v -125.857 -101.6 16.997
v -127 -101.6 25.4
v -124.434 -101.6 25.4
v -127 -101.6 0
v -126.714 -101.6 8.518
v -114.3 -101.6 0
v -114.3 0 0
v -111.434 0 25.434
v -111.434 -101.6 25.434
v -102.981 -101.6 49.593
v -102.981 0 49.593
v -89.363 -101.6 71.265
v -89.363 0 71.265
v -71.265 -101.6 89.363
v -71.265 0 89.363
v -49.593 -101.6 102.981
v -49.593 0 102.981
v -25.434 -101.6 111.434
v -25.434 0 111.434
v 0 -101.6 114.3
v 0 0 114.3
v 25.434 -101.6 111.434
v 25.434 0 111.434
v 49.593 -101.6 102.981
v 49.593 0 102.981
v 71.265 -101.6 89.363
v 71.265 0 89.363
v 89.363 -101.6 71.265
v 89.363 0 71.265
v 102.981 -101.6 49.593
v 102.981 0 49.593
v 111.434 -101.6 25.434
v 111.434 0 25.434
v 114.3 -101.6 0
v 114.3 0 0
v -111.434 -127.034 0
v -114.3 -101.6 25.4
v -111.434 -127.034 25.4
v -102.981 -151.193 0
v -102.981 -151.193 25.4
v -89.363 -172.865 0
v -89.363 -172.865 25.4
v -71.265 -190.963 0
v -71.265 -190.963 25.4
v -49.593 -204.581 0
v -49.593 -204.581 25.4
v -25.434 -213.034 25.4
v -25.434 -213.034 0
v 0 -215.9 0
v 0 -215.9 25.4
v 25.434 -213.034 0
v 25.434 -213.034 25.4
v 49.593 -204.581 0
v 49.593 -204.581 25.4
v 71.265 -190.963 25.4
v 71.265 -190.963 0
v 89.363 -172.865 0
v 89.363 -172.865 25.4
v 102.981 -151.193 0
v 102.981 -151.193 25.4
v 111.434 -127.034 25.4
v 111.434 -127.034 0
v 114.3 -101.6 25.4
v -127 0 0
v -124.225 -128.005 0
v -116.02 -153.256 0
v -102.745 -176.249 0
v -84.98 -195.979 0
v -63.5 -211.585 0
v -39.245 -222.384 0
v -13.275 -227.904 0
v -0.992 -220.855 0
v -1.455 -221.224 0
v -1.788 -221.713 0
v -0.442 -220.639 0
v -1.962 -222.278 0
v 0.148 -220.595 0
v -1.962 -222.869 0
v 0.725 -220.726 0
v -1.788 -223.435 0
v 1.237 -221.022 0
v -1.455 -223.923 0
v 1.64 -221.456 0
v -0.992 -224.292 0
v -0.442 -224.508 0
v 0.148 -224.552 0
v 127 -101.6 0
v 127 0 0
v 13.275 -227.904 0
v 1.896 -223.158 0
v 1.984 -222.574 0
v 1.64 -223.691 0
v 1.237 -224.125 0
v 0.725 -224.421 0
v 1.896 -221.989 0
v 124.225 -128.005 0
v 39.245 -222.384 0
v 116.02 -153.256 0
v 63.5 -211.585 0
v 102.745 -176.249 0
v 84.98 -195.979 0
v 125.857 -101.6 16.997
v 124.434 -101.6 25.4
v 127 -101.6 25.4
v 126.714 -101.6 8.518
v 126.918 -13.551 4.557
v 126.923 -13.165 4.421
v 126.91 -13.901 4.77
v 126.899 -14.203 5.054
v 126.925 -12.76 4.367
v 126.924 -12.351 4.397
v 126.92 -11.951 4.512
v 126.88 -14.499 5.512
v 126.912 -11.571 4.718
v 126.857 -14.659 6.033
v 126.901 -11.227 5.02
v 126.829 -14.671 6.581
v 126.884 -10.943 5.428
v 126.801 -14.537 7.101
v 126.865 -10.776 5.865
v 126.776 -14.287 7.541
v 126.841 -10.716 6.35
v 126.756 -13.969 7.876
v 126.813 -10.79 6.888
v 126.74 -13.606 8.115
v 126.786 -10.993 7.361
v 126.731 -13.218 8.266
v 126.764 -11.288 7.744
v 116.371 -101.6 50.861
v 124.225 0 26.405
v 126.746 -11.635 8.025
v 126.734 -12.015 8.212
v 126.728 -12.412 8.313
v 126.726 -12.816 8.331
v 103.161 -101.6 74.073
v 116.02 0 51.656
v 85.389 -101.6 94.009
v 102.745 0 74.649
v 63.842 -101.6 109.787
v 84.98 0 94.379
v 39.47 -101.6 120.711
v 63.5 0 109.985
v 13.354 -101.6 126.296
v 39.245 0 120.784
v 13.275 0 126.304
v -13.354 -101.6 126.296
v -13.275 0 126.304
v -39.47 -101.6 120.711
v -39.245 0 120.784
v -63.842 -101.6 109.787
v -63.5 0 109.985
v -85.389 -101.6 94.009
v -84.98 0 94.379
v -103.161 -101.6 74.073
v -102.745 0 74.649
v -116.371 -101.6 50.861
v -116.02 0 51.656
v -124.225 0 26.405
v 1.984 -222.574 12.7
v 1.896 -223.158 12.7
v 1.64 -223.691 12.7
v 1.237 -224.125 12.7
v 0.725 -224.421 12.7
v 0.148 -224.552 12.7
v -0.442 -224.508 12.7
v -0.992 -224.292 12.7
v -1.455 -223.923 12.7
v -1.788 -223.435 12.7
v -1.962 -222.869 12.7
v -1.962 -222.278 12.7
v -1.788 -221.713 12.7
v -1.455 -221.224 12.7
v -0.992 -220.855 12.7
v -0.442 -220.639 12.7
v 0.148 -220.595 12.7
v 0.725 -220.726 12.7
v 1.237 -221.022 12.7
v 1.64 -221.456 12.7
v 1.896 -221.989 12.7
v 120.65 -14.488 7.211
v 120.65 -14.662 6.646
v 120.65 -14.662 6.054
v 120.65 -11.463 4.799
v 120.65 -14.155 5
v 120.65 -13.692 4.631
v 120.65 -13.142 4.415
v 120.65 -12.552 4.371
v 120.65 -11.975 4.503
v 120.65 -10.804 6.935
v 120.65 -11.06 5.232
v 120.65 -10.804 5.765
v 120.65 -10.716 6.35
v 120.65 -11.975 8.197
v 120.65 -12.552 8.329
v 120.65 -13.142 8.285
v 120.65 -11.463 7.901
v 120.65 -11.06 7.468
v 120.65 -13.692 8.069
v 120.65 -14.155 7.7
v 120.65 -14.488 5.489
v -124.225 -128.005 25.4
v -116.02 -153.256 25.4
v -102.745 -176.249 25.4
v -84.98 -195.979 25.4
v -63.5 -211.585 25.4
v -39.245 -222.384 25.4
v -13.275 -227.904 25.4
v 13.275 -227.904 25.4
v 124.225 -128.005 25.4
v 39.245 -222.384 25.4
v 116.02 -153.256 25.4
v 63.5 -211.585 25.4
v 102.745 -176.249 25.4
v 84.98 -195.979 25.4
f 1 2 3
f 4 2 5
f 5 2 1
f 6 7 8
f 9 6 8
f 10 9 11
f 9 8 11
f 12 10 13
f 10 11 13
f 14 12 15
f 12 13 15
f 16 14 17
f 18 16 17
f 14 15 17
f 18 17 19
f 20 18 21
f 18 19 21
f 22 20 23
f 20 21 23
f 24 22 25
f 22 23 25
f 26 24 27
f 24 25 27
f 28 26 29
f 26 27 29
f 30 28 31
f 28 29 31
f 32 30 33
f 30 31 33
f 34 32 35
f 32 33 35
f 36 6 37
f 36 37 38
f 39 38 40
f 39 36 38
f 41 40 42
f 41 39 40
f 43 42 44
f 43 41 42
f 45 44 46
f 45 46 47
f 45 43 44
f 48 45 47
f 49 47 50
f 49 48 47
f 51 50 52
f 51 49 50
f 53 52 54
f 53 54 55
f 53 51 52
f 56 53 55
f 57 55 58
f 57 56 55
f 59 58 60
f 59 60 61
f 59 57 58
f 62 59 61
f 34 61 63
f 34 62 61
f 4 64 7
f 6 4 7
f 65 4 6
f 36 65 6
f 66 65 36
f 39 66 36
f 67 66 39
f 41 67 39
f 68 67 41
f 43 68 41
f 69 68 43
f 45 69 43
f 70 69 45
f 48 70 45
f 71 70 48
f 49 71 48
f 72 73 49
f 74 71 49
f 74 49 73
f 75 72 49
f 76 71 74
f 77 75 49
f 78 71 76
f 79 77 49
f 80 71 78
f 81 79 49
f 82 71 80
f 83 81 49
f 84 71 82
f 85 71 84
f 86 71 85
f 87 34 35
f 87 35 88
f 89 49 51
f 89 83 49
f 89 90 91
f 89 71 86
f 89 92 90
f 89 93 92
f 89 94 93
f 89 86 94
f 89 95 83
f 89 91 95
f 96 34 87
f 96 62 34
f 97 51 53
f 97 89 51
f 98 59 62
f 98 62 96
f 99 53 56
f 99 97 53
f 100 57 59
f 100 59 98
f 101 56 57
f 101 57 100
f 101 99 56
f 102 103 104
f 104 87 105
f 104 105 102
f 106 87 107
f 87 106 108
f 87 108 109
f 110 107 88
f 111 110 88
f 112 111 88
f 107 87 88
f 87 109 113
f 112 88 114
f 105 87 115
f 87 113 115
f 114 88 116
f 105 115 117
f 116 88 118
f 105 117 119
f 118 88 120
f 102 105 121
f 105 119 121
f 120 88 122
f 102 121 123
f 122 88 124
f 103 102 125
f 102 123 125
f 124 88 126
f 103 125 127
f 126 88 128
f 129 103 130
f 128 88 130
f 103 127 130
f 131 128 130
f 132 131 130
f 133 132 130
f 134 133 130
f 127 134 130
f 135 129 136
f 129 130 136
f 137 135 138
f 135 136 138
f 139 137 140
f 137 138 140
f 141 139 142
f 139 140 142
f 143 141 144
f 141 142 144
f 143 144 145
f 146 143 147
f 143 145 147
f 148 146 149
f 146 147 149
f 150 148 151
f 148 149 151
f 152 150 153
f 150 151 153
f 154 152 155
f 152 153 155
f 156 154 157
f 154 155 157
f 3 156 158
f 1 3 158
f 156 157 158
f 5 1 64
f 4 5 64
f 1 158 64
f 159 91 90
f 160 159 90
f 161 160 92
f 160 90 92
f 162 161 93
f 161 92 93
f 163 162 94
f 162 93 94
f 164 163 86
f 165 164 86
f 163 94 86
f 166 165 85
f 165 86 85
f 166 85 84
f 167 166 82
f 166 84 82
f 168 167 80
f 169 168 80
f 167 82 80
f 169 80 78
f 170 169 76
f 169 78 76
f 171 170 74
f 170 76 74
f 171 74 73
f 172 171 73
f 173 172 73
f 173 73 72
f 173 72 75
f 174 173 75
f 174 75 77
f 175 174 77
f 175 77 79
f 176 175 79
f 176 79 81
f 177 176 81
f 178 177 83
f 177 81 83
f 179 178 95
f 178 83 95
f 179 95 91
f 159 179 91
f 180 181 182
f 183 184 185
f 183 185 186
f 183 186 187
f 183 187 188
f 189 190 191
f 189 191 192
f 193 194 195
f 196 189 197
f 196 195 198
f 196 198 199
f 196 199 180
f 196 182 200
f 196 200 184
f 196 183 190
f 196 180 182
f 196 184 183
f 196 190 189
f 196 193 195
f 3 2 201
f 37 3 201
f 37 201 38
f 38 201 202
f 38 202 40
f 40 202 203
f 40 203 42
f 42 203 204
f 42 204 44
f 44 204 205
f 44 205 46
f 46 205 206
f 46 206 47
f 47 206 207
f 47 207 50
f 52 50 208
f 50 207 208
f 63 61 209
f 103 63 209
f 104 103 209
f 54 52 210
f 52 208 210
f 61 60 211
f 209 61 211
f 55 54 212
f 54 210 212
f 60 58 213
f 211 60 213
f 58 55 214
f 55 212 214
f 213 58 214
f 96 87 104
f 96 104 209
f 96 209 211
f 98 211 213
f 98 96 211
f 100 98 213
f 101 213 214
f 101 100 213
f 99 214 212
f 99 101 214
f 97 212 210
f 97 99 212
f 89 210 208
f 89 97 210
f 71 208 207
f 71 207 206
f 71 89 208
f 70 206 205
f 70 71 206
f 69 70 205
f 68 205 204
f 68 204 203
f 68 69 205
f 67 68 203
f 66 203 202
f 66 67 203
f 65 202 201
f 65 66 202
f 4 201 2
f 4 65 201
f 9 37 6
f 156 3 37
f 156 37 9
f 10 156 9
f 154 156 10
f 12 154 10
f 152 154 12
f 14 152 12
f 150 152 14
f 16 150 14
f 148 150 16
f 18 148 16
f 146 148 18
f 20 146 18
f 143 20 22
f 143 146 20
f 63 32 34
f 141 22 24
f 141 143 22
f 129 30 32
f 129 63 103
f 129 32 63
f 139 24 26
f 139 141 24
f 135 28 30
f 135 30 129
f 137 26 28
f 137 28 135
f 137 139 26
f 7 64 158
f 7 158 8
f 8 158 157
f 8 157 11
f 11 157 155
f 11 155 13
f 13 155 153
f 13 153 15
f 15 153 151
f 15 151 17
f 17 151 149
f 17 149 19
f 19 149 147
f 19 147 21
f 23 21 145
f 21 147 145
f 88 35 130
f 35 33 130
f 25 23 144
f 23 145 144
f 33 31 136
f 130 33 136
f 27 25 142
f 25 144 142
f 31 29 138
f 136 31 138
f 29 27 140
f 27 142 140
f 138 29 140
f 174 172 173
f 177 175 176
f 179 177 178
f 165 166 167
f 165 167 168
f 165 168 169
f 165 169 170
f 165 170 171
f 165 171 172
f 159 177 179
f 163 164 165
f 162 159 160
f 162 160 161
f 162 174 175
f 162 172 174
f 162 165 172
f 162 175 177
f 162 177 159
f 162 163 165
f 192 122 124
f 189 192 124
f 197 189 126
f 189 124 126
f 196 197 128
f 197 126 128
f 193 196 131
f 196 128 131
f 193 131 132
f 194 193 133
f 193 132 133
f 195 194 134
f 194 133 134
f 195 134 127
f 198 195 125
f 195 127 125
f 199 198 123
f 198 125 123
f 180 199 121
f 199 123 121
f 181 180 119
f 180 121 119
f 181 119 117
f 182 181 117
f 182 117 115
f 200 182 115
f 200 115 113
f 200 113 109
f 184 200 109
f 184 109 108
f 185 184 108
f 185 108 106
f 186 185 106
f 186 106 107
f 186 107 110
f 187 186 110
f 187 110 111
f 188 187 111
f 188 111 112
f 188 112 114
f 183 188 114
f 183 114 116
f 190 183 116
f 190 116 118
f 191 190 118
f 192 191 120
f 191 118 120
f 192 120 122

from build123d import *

# Parameters (mm, degrees)
F1_DEPTH = 101.6
F3_R     = 1.984375
F4_DEPTH = 25.4
F6_R     = 1.984375
F7_DEPTH = 31.75
F8_DEPTH = 25.4
F9_DEPTH = 12.7


with BuildPart() as f1:
    # F0 (on Front) → F1 (new body)
    with BuildSketch(Plane.XZ):
        with BuildLine():
            Line((114.3, 0), (127, 0))
            ThreePointArc((127, 0), (0, 127), (-127, 0))
            Line((-127, 0), (-114.3, 0))
            ThreePointArc((-114.3, 0), (0, 114.3), (114.3, 0))
        make_face()
    extrude(amount=F1_DEPTH)

    # F3 (on face) → F4 (cut)
    with BuildSketch(Plane(origin=(0, 0, 0), x_dir=(1, 0, 0), z_dir=(0, 0, -1))):
        with Locations((0, 222.573593)):
            Circle(F3_R)
    extrude(amount=-F4_DEPTH, mode=Mode.SUBTRACT)

    # F6 (on offset) → F7 (cut)
    with BuildSketch(Plane.YZ.offset(152.4)):
        with Locations((-12.7, 6.35)):
            Circle(F6_R)
    extrude(amount=-F7_DEPTH, mode=Mode.SUBTRACT)

    # F2 (on face) → F8 (join)
    with BuildSketch(Plane(origin=(0, 0, 0), x_dir=(1, 0, 0), z_dir=(0, 0, -1))):
        with BuildLine():
            ThreePointArc((-114.3, 101.6), (0, 215.9), (114.3, 101.6))
            Line((114.3, 101.6), (127, 101.6))
            ThreePointArc((127, 101.6), (0, 228.6), (-127, 101.6))
            Line((-127, 101.6), (-114.3, 101.6))
        make_face()
    extrude(amount=-F8_DEPTH)

    # F3 (on face) → F9 (cut)
    with BuildSketch(Plane(origin=(0, 0, 0), x_dir=(1, 0, 0), z_dir=(0, 0, -1))):
        with Locations((0, 222.573593)):
            Circle(F3_R)
    extrude(amount=-F9_DEPTH, mode=Mode.SUBTRACT)


solid = f1.part
